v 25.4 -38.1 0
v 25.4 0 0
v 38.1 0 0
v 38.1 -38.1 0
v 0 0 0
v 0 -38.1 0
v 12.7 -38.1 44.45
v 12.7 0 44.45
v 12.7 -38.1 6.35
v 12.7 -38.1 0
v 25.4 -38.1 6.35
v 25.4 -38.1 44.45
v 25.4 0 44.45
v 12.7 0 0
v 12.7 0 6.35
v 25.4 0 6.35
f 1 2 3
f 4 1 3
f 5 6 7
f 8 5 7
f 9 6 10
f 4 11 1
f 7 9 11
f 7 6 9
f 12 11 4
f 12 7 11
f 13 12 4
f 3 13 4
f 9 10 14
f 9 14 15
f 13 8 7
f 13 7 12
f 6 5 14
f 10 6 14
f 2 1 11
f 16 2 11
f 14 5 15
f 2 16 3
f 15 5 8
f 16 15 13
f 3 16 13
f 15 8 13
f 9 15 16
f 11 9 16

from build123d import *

# Parameters (mm, degrees)
F0_W     = 38.1
F0_H     = 44.45
F1_DEPTH = 38.1
F2_W     = 12.7
F2_H     = 6.35
F3_DEPTH = 65.532
F5_DEPTH = 60.706
F7_DEPTH = 60.706


with BuildPart() as f1:
    # F0 (on Front) → F1 (new body)
    with BuildSketch(Plane.XZ):
        with Locations((19.05, 22.225)):
            Rectangle(F0_W, F0_H)
    extrude(amount=F1_DEPTH)

    # F2 (on face) → F3 (cut)
    with BuildSketch(Plane.XZ.offset(38.1)):
        with Locations((19.05, 3.175)):
            Rectangle(F2_W, F2_H)
    extrude(amount=-F3_DEPTH, mode=Mode.SUBTRACT)

    # F4 (on face) → F5 (cut)
    with BuildSketch(Plane.XZ.offset(38.1)):
        Polygon((0, 0), (12.7, 44.45), (0, 44.45), align=None)
    extrude(amount=-F5_DEPTH, mode=Mode.SUBTRACT)

    # F6 (on face) → F7 (cut)
    with BuildSketch(Plane.XZ.offset(38.1)):
        Polygon((38.1, 44.45), (25.4, 44.45), (38.1, 0), align=None)
    extrude(amount=-F7_DEPTH, mode=Mode.SUBTRACT)


solid = f1.part
